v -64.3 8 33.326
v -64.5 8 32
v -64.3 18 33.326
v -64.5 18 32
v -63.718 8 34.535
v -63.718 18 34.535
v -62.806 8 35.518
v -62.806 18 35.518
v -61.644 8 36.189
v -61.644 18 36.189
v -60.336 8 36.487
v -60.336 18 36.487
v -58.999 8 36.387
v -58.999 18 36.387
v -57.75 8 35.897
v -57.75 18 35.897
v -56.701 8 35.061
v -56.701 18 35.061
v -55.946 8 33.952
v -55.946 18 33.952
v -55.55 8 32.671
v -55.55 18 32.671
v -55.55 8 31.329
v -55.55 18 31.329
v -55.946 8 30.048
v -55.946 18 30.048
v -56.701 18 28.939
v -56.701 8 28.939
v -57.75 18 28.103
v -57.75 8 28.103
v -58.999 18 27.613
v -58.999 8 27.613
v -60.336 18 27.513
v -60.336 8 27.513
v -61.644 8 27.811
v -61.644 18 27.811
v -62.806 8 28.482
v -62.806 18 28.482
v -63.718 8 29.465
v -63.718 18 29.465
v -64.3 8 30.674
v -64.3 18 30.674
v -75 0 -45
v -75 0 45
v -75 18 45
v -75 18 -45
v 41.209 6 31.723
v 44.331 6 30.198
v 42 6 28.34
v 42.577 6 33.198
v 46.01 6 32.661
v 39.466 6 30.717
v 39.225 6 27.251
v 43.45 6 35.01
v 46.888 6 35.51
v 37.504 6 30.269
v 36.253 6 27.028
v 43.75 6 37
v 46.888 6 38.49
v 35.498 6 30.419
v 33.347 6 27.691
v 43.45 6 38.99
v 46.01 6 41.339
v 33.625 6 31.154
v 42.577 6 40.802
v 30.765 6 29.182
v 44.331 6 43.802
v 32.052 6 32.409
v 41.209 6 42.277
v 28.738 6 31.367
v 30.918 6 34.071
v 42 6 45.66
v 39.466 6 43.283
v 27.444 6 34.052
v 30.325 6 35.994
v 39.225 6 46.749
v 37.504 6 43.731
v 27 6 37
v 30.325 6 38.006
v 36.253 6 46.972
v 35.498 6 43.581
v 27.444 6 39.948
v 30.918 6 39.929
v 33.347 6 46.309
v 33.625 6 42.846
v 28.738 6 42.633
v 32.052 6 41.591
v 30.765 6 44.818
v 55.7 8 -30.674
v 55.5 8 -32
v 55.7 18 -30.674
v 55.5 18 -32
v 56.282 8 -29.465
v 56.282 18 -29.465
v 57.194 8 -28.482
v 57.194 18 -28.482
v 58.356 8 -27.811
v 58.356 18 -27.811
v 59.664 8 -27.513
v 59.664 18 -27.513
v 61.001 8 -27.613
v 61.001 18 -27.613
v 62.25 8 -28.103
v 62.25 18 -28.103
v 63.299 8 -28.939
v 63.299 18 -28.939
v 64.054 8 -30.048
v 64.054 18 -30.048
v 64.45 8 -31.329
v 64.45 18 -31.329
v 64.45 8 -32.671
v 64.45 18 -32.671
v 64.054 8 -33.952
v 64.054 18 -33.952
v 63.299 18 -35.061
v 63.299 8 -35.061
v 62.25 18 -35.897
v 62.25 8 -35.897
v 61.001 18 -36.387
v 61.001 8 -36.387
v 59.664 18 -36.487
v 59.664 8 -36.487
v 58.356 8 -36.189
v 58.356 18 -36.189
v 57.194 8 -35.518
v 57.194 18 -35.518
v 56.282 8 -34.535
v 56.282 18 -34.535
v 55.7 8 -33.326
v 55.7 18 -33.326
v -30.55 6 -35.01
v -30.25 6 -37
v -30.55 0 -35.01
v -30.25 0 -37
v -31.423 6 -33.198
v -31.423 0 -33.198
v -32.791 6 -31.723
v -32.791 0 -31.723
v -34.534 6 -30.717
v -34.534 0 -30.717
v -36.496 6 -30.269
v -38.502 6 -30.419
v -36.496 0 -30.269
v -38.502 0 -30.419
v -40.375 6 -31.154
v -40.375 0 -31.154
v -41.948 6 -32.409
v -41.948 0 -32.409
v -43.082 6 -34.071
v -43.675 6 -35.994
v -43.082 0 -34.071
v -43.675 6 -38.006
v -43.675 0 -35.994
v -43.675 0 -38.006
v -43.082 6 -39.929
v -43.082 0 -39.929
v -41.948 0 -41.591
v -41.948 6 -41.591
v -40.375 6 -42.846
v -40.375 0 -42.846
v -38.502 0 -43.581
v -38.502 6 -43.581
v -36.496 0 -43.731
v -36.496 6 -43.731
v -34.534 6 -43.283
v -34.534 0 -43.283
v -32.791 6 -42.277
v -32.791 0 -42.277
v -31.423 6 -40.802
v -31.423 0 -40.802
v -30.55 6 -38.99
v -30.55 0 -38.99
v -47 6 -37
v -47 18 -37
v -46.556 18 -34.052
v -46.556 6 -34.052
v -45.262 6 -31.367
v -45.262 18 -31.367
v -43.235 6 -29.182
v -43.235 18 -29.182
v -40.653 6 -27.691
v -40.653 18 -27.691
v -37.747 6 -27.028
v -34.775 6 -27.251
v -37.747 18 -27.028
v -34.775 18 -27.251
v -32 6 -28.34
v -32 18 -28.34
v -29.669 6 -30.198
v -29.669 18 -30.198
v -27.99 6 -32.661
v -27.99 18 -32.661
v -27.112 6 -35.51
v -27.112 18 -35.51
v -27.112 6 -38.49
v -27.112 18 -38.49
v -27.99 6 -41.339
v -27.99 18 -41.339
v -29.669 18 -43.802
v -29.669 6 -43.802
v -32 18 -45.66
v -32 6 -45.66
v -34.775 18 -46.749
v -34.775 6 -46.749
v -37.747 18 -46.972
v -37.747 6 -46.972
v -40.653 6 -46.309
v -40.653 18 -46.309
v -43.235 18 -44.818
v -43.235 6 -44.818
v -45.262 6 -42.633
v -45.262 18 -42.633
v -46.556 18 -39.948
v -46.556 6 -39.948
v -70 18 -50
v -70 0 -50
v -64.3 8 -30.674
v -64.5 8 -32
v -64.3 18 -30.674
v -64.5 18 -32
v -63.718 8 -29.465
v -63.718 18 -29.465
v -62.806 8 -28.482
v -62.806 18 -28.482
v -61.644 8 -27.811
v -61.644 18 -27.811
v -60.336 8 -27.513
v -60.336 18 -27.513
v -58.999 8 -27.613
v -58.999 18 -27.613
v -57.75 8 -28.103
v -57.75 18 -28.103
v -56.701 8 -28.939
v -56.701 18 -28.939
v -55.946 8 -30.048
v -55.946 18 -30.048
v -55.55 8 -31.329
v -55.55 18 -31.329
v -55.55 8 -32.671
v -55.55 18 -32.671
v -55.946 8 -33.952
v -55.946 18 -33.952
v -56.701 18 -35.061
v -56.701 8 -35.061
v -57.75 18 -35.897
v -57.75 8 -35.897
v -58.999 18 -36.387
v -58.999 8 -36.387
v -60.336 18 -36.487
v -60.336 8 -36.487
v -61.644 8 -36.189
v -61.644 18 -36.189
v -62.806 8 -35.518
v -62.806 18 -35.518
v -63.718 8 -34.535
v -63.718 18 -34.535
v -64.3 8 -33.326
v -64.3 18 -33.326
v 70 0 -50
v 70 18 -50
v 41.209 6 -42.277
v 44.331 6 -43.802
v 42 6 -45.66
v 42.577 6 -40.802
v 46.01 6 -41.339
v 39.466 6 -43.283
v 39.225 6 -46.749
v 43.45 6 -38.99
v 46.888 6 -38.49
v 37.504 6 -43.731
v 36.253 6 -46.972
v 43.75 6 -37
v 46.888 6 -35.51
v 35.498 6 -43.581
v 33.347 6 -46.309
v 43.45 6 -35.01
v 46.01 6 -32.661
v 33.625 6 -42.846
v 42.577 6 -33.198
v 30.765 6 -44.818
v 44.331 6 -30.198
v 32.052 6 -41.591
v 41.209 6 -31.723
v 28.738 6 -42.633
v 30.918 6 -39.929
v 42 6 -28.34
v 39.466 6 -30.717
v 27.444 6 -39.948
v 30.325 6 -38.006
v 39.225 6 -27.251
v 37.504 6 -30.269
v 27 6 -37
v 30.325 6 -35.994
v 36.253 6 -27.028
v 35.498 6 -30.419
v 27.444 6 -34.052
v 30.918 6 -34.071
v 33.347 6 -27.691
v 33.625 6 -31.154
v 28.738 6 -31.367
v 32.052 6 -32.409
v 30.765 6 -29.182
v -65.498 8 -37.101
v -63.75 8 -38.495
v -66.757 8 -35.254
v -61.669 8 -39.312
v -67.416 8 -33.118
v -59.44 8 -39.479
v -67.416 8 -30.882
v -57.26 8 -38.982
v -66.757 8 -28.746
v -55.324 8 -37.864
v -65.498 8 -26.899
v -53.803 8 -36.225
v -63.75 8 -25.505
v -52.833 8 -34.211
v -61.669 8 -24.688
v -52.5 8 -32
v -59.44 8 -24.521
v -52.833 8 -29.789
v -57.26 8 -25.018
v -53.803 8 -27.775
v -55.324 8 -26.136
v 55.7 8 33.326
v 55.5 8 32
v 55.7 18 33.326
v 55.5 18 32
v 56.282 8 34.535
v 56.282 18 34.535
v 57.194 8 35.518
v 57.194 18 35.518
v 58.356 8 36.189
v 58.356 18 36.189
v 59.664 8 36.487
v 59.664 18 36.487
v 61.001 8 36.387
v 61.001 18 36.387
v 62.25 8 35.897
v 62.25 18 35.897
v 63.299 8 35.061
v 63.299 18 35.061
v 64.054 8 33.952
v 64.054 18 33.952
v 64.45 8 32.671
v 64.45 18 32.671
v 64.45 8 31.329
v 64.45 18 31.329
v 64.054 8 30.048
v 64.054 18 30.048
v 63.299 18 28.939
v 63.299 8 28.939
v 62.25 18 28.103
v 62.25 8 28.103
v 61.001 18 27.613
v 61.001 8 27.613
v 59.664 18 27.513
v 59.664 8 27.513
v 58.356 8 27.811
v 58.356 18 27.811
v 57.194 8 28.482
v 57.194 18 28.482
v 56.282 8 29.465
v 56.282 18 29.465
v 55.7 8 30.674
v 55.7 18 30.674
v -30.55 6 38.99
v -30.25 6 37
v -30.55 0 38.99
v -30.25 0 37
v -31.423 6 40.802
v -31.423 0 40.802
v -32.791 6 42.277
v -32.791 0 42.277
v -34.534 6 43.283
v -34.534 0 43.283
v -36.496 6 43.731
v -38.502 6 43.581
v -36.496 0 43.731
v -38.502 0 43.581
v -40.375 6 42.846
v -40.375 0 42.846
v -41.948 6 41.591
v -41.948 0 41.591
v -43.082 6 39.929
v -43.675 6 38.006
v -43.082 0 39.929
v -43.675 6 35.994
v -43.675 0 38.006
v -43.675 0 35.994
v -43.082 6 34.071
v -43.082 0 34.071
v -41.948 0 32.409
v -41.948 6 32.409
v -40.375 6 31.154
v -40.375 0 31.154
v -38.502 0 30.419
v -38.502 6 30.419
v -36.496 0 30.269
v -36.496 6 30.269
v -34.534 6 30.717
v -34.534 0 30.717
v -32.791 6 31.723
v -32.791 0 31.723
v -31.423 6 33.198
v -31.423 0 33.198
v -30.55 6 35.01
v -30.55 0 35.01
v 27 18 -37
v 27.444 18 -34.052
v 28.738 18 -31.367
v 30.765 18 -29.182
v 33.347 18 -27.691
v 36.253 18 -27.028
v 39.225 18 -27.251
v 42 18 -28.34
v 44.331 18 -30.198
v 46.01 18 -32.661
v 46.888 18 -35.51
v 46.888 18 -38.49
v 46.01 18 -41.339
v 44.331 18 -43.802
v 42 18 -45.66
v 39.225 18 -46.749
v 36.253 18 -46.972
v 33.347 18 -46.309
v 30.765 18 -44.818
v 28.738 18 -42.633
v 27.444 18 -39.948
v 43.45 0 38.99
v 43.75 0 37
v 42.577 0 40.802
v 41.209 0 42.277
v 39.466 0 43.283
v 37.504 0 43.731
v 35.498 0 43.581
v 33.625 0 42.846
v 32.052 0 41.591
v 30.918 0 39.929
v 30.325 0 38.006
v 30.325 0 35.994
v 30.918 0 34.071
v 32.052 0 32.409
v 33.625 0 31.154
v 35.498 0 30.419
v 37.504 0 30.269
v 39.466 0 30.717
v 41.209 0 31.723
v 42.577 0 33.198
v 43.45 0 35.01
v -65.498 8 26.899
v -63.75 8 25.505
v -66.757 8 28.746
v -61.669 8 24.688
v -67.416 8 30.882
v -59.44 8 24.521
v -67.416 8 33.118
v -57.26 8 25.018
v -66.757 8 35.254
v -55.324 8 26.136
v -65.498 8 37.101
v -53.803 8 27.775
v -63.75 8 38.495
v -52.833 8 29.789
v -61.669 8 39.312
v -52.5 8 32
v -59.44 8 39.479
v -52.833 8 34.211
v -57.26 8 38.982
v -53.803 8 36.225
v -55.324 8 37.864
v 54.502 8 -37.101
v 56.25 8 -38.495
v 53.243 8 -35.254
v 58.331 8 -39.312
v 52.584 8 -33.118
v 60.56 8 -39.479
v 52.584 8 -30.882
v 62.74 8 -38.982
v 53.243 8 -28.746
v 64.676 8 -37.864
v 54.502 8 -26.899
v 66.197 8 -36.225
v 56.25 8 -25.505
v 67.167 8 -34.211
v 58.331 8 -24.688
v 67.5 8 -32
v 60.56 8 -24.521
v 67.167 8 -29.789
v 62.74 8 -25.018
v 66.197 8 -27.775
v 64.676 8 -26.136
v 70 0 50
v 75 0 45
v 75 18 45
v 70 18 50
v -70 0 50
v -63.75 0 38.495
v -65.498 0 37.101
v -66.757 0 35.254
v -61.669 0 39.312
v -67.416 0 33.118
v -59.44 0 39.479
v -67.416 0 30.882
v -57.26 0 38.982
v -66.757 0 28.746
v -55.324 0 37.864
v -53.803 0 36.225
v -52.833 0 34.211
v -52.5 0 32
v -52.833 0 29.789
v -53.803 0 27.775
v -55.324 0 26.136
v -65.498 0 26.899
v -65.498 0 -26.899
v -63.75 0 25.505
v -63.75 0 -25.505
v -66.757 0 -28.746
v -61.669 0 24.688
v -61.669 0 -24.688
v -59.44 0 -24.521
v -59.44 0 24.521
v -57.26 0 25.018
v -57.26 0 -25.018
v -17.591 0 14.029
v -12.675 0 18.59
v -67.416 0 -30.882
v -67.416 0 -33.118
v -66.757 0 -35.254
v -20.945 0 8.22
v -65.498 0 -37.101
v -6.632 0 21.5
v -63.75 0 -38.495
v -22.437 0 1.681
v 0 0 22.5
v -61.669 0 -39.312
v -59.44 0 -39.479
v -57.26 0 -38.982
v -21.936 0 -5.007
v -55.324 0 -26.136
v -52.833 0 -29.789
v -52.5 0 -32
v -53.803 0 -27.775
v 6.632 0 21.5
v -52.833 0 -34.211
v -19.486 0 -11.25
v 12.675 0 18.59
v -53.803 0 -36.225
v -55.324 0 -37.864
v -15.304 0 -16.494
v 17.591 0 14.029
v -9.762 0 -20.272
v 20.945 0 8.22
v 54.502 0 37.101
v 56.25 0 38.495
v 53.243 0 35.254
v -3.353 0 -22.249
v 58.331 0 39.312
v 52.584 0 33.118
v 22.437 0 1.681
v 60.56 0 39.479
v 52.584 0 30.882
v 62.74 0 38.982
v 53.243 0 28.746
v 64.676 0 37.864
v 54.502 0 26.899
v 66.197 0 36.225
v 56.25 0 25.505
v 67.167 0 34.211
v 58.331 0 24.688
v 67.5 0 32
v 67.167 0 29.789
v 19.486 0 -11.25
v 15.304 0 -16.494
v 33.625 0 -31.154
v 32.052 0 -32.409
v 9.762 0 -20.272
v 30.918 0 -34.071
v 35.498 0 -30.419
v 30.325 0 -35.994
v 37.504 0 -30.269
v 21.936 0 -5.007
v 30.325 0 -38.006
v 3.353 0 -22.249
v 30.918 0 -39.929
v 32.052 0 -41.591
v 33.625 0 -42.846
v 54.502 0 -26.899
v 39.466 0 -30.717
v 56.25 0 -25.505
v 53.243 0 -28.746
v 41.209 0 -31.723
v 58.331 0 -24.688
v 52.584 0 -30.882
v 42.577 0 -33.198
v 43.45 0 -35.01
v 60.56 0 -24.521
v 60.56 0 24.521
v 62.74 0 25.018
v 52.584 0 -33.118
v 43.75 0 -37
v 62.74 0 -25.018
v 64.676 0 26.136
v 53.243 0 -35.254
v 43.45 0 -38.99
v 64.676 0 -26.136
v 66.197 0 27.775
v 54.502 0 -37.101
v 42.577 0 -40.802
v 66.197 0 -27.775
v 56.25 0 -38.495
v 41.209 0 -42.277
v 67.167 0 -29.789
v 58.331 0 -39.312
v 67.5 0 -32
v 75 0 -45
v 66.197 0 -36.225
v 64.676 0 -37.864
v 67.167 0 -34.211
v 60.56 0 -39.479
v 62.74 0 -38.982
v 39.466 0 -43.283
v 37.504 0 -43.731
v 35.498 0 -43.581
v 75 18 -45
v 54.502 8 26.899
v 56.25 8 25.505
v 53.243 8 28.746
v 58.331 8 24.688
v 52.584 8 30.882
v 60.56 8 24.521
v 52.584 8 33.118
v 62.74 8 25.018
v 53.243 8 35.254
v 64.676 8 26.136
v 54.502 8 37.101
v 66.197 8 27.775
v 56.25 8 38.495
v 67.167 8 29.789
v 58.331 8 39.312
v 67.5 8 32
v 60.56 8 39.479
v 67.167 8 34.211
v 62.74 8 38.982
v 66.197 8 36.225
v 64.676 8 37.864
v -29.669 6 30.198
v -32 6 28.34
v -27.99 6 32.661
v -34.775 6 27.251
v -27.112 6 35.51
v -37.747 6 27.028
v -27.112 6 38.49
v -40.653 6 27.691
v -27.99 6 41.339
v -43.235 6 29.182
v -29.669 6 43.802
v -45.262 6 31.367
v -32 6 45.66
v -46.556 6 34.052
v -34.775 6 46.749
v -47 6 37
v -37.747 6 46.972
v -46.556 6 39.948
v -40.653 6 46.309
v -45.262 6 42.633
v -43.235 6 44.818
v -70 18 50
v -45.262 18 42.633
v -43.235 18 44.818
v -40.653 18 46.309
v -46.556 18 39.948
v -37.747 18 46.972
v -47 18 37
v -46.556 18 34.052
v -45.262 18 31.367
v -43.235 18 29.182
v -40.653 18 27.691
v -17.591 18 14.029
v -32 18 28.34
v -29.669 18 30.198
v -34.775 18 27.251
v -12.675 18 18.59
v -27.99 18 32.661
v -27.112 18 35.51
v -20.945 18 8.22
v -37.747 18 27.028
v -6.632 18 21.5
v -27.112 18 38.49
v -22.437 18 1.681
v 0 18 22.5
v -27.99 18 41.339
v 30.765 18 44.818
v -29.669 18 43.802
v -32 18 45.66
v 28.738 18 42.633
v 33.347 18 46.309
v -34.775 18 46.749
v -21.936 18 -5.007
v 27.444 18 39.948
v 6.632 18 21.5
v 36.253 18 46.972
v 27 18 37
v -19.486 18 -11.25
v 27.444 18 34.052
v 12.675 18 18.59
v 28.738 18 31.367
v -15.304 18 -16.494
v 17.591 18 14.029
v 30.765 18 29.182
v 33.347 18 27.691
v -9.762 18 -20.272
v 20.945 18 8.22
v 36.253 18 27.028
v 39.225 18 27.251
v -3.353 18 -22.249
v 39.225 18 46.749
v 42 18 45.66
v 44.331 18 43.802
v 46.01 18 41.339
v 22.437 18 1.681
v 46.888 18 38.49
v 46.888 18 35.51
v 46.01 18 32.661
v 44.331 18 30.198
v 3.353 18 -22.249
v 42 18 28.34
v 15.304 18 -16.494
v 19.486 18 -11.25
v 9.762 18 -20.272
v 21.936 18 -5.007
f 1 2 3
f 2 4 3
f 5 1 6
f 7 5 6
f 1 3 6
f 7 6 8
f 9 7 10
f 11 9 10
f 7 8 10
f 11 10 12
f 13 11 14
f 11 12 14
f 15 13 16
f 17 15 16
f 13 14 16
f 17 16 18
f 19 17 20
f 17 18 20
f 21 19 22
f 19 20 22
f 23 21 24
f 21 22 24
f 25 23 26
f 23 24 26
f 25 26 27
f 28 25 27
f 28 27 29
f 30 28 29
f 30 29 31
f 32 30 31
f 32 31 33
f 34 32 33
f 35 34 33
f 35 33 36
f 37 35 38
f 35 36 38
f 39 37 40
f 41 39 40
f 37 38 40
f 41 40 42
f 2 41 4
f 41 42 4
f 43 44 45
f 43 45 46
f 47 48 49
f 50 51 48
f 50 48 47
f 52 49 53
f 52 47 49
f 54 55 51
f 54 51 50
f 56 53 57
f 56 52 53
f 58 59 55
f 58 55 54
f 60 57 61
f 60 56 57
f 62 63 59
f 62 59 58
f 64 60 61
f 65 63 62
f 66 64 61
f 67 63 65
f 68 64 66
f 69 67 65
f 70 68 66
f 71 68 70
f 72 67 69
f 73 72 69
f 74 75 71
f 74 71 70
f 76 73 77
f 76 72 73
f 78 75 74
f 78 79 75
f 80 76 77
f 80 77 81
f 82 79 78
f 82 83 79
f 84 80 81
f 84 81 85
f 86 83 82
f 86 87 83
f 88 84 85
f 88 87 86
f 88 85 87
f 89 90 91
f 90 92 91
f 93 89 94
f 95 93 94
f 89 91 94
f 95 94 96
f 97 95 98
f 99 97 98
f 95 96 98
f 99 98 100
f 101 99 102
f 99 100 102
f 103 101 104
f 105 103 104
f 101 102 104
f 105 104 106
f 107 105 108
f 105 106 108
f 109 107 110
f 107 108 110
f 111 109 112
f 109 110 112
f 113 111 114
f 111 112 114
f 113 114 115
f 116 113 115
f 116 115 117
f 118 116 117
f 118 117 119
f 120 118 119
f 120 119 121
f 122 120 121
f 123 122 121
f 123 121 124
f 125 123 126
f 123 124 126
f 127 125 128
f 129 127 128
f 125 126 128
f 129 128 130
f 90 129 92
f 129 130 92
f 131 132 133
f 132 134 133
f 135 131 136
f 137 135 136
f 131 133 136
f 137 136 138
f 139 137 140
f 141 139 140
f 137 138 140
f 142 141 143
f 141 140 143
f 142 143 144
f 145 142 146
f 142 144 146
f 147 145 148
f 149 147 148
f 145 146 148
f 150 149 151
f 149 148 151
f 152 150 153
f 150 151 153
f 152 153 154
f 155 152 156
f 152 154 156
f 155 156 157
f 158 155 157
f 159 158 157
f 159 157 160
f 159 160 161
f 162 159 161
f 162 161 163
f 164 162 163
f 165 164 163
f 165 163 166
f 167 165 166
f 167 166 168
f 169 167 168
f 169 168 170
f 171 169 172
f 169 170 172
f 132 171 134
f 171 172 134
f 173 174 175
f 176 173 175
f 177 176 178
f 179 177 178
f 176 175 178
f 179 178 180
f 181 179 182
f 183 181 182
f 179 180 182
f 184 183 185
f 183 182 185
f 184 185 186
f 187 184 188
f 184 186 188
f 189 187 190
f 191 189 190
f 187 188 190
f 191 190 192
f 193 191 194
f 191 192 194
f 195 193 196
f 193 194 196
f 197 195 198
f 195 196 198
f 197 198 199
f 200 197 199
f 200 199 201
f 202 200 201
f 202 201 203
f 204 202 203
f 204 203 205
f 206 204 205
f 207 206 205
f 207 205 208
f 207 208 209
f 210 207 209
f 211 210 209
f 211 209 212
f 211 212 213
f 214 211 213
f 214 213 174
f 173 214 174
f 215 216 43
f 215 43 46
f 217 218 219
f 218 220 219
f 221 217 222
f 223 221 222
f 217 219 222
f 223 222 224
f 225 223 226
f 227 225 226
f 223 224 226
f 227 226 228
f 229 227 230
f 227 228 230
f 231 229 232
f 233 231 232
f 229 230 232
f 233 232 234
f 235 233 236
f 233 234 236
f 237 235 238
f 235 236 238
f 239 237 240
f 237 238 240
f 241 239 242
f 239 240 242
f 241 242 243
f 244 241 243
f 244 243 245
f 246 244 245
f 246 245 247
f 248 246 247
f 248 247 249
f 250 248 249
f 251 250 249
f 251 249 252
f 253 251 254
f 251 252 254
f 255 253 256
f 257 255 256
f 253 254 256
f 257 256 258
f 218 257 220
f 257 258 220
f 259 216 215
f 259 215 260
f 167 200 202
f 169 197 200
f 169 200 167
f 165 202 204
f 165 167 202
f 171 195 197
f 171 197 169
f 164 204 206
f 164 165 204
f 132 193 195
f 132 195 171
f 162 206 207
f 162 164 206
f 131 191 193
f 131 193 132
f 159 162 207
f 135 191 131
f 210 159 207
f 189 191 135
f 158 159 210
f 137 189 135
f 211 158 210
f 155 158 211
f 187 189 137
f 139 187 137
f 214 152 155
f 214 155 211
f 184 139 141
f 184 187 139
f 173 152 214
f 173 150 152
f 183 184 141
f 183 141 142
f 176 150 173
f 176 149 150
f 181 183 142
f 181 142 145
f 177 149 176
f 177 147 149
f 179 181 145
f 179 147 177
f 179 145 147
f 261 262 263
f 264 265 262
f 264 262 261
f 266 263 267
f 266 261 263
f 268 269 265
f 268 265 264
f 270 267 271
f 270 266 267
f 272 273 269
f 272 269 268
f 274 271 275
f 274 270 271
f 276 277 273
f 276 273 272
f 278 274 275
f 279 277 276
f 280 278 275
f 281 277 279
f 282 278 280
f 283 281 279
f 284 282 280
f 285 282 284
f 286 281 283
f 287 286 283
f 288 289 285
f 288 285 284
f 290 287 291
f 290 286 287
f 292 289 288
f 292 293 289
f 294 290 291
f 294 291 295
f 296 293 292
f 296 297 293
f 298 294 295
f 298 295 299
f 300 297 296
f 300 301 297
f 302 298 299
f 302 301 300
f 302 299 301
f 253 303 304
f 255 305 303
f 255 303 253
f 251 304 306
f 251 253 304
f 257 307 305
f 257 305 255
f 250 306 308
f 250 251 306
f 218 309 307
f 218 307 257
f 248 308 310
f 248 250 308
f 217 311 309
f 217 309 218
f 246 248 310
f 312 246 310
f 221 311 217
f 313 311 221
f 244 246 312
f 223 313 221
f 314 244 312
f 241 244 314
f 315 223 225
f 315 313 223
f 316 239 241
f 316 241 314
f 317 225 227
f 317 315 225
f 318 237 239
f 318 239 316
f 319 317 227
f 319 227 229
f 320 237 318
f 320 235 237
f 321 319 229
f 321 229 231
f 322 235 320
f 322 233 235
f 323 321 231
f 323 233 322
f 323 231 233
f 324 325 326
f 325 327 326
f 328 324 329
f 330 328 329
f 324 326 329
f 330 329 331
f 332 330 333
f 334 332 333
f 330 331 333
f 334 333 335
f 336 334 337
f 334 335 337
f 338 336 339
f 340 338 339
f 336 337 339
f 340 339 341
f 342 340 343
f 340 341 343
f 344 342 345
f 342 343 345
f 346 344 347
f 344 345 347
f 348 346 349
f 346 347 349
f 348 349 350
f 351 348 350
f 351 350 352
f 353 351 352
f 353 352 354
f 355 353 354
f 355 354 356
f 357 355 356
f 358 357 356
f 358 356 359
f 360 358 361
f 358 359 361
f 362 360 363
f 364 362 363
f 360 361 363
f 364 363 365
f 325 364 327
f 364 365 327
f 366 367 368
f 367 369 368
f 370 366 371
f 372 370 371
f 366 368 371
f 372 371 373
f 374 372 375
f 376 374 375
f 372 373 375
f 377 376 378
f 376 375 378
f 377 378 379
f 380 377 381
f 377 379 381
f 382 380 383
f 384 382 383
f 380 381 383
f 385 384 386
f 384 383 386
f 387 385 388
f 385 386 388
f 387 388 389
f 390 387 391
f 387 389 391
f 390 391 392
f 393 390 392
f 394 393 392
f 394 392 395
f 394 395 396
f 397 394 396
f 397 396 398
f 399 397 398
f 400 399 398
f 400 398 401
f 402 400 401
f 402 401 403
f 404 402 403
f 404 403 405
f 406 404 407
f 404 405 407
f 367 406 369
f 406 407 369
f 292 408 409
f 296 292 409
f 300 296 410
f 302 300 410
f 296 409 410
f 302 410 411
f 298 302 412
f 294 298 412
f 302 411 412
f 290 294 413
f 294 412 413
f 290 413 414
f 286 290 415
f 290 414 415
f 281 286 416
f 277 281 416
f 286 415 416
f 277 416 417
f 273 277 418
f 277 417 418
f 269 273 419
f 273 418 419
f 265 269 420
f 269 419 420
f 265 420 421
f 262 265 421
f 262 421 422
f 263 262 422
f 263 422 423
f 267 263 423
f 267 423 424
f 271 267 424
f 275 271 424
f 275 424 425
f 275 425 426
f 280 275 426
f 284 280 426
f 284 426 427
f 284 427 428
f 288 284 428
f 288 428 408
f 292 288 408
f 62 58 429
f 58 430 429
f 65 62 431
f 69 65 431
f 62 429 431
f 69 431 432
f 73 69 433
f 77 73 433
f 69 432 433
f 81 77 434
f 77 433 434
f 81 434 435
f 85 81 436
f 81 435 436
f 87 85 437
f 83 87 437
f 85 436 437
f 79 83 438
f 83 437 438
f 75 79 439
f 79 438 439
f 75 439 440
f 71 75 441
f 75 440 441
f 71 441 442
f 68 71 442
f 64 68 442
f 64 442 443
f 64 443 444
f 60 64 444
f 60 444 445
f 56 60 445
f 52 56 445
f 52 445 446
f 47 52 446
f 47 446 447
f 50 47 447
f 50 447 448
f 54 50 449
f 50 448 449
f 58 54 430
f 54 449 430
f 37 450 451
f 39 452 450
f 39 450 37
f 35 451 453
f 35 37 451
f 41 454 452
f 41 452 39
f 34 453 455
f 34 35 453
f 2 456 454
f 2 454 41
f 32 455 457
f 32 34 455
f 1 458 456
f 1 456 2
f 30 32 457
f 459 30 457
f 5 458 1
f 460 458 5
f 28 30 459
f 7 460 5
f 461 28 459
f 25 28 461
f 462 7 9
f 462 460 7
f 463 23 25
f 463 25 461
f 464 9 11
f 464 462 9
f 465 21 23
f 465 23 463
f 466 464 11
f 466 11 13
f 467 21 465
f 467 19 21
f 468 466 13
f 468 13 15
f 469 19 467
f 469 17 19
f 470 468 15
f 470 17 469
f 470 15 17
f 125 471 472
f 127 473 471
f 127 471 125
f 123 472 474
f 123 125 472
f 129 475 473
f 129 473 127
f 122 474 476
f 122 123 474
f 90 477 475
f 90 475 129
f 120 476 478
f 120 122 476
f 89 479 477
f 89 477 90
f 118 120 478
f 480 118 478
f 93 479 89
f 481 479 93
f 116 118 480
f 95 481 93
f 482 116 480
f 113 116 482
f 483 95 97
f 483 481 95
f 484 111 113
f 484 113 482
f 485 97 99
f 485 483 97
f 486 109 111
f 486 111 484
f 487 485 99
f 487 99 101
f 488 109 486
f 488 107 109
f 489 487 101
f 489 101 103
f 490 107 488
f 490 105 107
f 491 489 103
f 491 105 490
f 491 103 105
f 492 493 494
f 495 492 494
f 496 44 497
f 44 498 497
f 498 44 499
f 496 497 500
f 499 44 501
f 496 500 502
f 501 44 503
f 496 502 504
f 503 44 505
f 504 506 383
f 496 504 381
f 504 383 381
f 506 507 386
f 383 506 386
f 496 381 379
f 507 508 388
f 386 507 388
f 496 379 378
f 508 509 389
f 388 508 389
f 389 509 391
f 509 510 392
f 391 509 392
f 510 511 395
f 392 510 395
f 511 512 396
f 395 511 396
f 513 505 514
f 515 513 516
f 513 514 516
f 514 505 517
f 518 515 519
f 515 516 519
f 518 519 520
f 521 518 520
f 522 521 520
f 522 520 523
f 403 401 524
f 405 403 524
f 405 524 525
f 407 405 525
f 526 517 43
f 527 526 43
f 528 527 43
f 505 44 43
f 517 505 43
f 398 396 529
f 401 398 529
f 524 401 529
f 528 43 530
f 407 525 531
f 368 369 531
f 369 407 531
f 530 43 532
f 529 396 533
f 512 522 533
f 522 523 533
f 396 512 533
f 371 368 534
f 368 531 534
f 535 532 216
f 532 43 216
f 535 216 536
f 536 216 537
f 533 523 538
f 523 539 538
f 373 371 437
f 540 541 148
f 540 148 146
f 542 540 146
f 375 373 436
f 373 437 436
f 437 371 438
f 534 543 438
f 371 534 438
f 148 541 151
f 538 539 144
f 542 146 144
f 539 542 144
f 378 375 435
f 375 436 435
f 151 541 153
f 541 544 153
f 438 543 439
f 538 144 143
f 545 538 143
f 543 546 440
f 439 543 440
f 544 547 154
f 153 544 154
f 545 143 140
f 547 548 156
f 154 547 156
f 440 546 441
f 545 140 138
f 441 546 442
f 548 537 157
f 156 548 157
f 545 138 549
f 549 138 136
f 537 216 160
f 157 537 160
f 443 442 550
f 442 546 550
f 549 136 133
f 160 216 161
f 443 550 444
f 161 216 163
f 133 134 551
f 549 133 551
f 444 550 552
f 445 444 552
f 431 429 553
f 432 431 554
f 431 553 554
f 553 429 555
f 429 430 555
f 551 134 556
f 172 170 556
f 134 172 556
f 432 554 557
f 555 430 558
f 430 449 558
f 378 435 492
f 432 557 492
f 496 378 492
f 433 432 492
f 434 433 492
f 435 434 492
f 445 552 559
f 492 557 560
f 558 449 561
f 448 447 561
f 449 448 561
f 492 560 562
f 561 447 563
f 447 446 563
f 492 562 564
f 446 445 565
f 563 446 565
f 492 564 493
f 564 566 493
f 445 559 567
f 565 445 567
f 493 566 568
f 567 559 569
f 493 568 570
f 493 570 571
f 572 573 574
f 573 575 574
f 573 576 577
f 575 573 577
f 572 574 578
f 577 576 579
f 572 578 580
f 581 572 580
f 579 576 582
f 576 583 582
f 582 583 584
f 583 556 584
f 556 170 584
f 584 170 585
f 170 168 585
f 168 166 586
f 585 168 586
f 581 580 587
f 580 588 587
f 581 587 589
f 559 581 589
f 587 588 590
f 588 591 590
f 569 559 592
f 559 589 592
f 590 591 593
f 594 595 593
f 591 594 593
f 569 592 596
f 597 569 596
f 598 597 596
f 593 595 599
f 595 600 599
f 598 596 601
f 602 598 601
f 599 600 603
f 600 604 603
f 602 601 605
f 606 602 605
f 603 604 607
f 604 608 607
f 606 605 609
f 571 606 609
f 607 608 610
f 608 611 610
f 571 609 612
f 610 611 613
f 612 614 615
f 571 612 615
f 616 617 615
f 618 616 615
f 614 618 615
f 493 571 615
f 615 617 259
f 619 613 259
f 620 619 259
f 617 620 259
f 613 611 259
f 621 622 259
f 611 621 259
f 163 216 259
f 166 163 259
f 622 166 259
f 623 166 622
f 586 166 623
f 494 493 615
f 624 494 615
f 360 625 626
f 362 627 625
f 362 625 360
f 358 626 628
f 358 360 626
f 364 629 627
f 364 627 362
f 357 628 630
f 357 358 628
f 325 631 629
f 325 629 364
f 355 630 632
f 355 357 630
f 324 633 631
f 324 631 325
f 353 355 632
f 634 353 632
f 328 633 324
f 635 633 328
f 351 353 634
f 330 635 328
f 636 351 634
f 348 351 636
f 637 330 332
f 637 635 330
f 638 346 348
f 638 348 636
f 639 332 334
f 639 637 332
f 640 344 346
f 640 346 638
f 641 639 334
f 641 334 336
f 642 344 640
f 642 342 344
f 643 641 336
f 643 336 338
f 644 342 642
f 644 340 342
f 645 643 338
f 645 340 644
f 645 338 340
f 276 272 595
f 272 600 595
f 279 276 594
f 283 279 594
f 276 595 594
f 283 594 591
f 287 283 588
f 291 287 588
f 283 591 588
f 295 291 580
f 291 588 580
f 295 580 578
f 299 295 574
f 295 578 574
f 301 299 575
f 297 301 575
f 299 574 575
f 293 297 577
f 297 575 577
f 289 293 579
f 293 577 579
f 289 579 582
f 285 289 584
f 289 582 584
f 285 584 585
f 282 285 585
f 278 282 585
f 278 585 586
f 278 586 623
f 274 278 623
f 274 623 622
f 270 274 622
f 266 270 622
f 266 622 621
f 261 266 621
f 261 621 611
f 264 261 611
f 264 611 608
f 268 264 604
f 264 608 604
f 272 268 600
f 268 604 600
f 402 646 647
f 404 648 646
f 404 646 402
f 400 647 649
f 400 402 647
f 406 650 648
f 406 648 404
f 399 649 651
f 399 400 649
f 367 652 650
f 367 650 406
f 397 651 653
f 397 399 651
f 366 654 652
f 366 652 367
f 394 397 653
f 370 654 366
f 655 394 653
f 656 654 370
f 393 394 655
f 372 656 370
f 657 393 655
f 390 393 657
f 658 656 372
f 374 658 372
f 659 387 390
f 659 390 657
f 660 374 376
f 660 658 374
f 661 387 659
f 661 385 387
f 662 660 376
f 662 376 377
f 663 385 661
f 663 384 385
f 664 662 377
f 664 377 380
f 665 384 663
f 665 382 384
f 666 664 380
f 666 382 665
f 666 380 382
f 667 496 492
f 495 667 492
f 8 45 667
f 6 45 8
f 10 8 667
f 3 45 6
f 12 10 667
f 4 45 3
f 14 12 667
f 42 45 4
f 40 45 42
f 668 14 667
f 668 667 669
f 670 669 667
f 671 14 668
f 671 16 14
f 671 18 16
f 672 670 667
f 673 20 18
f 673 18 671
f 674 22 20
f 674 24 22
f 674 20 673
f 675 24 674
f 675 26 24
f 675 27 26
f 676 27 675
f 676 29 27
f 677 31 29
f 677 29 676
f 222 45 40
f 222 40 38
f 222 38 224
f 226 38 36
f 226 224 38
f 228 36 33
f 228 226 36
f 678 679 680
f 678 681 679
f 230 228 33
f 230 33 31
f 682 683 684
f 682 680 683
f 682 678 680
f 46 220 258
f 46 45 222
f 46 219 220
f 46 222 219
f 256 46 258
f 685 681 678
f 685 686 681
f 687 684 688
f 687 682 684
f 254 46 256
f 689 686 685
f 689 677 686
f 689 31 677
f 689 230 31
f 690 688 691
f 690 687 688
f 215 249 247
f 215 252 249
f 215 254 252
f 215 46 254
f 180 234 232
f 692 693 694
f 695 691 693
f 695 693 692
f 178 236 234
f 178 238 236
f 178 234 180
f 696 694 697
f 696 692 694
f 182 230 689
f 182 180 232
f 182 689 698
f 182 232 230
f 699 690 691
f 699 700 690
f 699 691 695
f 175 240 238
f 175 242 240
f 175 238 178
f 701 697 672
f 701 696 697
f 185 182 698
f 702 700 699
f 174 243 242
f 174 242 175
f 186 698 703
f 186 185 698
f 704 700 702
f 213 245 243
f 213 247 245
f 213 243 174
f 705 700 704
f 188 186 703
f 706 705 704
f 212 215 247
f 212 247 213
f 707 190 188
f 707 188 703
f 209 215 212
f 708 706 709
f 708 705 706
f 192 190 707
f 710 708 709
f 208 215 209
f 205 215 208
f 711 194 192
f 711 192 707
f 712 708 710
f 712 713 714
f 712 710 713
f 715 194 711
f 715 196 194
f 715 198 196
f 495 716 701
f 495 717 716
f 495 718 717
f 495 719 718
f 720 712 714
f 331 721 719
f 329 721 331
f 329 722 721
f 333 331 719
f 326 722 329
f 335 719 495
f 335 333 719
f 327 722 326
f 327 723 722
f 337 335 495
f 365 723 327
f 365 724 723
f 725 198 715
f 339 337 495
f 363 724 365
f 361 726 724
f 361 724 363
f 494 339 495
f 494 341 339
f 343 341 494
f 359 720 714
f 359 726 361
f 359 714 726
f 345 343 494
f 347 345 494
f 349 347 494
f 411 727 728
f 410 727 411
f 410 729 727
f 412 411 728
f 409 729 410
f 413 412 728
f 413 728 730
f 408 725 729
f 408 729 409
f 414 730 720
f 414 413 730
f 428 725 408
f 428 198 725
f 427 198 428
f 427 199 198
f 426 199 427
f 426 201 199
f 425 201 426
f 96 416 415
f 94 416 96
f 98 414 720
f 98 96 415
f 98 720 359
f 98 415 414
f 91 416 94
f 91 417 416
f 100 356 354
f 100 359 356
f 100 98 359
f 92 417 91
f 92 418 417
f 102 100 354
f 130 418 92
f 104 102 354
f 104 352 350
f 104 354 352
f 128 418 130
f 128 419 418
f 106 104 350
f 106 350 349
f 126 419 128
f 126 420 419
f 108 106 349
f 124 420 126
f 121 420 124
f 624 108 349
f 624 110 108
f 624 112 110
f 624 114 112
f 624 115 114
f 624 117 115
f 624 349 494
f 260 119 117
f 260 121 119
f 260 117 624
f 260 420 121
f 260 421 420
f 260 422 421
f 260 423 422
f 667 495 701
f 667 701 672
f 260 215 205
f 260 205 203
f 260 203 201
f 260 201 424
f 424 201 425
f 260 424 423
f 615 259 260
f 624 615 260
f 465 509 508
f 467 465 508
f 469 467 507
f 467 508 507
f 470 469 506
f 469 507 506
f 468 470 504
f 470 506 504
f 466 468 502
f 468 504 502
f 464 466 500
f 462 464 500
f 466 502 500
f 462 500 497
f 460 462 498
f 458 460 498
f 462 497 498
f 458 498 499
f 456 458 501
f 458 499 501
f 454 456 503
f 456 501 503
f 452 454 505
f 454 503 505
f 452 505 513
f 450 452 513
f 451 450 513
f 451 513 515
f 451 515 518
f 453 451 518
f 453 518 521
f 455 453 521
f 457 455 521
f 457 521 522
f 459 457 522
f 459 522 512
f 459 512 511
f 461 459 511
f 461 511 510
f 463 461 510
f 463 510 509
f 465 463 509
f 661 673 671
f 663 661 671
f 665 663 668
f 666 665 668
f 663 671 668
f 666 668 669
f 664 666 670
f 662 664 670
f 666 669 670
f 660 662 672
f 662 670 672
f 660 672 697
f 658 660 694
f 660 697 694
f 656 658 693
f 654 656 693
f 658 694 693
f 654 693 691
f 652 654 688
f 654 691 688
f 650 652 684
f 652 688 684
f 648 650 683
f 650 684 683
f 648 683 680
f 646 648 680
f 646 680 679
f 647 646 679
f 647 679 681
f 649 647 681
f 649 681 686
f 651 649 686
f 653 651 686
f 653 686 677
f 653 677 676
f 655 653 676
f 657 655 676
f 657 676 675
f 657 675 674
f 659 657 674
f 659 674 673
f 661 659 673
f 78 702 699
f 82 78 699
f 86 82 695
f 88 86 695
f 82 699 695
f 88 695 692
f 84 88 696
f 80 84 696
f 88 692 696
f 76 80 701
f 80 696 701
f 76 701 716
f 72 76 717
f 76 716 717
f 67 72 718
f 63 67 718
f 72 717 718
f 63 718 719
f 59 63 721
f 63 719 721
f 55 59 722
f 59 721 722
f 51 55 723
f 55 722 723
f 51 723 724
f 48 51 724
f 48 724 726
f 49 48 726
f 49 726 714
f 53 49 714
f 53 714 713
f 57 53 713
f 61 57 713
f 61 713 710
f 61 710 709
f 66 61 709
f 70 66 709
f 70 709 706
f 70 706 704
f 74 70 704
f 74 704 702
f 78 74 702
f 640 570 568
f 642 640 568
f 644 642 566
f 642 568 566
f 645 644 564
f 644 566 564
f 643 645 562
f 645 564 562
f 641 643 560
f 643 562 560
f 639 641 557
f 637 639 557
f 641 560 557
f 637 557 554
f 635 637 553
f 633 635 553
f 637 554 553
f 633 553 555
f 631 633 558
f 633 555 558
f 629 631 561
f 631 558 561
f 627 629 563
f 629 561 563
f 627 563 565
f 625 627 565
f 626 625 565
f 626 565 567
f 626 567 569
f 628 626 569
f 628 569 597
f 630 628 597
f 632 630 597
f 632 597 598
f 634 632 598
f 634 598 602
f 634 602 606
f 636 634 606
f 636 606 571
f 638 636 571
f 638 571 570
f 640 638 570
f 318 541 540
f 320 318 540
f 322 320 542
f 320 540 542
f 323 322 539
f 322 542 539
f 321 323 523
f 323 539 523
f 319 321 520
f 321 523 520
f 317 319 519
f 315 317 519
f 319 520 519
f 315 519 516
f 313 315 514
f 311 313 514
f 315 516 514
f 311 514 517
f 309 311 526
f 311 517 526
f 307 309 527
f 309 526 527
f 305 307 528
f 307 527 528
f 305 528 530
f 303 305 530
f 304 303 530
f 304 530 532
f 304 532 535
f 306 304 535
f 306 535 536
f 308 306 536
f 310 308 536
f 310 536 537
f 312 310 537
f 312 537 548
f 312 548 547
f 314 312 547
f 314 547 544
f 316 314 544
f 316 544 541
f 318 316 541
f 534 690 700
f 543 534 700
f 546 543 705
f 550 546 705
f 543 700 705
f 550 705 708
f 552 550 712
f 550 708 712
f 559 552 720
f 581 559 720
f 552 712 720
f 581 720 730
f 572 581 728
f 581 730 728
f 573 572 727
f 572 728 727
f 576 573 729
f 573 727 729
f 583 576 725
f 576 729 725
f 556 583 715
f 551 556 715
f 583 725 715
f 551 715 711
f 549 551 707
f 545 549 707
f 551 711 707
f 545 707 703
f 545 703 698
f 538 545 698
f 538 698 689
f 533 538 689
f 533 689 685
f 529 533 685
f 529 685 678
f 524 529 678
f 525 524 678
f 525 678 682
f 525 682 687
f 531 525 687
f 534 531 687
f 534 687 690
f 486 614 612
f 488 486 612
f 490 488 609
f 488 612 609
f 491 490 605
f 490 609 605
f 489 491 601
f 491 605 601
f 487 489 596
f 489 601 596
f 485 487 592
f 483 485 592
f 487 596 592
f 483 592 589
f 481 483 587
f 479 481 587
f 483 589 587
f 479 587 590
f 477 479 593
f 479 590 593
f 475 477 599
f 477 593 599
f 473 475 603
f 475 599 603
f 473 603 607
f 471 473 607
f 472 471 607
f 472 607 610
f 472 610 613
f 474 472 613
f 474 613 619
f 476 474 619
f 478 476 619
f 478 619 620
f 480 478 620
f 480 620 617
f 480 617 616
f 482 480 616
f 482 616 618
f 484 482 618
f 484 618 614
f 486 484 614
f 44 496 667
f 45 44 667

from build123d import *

# Parameters (mm, degrees)
SKETCH_1_W                    = 150
SKETCH_1_H                    = 100
EXTRUDE_1_DEPTH               = 18
CHAMFER_1_SIZE                = 5
HOLE_WIZARD_M8_1_D            = 9
HOLE_WIZARD_M8_1_CBORE_D      = 15
HOLE_WIZARD_M8_1_CBORE_DEPTH  = 8
HOLE_WIZARD_M12_5_D           = 13.5
HOLE_WIZARD_M12_5_CBORE_D     = 20
HOLE_WIZARD_M12_5_CBORE_DEPTH = 12
SKETCH_16_R                   = 22.5
CUT_EXTRUDE_3_DEPTH           = 92.91844211


with BuildPart() as part:
    # 草圖1 → 伸長1 (new body)
    with BuildSketch(Plane(origin=(0, 0, 0), x_dir=(1, 0, 0), z_dir=(0, 1, 0))):
        Rectangle(SKETCH_1_W, SKETCH_1_H)
    extrude(amount=EXTRUDE_1_DEPTH)

    # 導角1
    chamfer_1_edges = [part.edges().sort_by_distance(p)[0] for p in [
        (-75, 9, -50),
        (75, 9, -50),
        (75, 9, 50),
        (-75, 9, 50),
    ]]
    chamfer(chamfer_1_edges, length=CHAMFER_1_SIZE)

    # M8 六角承窩頭蓋螺釘的柱孔1 (through all)
    with Locations(Plane(origin=(-62.5, 0, 50), x_dir=(1, 0, 0), z_dir=(0, -1, 0))):
        with Locations((2.5, -82), (2.5, -18), (122.5, -18), (122.5, -82)):
            CounterBoreHole(HOLE_WIZARD_M8_1_D / 2, HOLE_WIZARD_M8_1_CBORE_D / 2, HOLE_WIZARD_M8_1_CBORE_DEPTH)

    # M12 六角承窩頭蓋螺釘的柱孔5 (through all)
    with Locations(Plane(origin=(0, 18, 0), x_dir=(-1, 0, 0), z_dir=(0, 1, 0))):
        with Locations((37, -37), (-37, -37), (-37, 37), (37, 37)):
            CounterBoreHole(HOLE_WIZARD_M12_5_D / 2, HOLE_WIZARD_M12_5_CBORE_D / 2, HOLE_WIZARD_M12_5_CBORE_DEPTH)

    # 草圖16 → 除料-伸長3 (cut, through all)
    with BuildSketch(Plane(origin=(0, 18, 0), x_dir=(1, 0, 0), z_dir=(0, 1, 0))):
        with Locations(Location((0, 0, 0), (0, 0, 270))):
            Circle(SKETCH_16_R)
    extrude(amount=-CUT_EXTRUDE_3_DEPTH, mode=Mode.SUBTRACT)


solid = part.part
